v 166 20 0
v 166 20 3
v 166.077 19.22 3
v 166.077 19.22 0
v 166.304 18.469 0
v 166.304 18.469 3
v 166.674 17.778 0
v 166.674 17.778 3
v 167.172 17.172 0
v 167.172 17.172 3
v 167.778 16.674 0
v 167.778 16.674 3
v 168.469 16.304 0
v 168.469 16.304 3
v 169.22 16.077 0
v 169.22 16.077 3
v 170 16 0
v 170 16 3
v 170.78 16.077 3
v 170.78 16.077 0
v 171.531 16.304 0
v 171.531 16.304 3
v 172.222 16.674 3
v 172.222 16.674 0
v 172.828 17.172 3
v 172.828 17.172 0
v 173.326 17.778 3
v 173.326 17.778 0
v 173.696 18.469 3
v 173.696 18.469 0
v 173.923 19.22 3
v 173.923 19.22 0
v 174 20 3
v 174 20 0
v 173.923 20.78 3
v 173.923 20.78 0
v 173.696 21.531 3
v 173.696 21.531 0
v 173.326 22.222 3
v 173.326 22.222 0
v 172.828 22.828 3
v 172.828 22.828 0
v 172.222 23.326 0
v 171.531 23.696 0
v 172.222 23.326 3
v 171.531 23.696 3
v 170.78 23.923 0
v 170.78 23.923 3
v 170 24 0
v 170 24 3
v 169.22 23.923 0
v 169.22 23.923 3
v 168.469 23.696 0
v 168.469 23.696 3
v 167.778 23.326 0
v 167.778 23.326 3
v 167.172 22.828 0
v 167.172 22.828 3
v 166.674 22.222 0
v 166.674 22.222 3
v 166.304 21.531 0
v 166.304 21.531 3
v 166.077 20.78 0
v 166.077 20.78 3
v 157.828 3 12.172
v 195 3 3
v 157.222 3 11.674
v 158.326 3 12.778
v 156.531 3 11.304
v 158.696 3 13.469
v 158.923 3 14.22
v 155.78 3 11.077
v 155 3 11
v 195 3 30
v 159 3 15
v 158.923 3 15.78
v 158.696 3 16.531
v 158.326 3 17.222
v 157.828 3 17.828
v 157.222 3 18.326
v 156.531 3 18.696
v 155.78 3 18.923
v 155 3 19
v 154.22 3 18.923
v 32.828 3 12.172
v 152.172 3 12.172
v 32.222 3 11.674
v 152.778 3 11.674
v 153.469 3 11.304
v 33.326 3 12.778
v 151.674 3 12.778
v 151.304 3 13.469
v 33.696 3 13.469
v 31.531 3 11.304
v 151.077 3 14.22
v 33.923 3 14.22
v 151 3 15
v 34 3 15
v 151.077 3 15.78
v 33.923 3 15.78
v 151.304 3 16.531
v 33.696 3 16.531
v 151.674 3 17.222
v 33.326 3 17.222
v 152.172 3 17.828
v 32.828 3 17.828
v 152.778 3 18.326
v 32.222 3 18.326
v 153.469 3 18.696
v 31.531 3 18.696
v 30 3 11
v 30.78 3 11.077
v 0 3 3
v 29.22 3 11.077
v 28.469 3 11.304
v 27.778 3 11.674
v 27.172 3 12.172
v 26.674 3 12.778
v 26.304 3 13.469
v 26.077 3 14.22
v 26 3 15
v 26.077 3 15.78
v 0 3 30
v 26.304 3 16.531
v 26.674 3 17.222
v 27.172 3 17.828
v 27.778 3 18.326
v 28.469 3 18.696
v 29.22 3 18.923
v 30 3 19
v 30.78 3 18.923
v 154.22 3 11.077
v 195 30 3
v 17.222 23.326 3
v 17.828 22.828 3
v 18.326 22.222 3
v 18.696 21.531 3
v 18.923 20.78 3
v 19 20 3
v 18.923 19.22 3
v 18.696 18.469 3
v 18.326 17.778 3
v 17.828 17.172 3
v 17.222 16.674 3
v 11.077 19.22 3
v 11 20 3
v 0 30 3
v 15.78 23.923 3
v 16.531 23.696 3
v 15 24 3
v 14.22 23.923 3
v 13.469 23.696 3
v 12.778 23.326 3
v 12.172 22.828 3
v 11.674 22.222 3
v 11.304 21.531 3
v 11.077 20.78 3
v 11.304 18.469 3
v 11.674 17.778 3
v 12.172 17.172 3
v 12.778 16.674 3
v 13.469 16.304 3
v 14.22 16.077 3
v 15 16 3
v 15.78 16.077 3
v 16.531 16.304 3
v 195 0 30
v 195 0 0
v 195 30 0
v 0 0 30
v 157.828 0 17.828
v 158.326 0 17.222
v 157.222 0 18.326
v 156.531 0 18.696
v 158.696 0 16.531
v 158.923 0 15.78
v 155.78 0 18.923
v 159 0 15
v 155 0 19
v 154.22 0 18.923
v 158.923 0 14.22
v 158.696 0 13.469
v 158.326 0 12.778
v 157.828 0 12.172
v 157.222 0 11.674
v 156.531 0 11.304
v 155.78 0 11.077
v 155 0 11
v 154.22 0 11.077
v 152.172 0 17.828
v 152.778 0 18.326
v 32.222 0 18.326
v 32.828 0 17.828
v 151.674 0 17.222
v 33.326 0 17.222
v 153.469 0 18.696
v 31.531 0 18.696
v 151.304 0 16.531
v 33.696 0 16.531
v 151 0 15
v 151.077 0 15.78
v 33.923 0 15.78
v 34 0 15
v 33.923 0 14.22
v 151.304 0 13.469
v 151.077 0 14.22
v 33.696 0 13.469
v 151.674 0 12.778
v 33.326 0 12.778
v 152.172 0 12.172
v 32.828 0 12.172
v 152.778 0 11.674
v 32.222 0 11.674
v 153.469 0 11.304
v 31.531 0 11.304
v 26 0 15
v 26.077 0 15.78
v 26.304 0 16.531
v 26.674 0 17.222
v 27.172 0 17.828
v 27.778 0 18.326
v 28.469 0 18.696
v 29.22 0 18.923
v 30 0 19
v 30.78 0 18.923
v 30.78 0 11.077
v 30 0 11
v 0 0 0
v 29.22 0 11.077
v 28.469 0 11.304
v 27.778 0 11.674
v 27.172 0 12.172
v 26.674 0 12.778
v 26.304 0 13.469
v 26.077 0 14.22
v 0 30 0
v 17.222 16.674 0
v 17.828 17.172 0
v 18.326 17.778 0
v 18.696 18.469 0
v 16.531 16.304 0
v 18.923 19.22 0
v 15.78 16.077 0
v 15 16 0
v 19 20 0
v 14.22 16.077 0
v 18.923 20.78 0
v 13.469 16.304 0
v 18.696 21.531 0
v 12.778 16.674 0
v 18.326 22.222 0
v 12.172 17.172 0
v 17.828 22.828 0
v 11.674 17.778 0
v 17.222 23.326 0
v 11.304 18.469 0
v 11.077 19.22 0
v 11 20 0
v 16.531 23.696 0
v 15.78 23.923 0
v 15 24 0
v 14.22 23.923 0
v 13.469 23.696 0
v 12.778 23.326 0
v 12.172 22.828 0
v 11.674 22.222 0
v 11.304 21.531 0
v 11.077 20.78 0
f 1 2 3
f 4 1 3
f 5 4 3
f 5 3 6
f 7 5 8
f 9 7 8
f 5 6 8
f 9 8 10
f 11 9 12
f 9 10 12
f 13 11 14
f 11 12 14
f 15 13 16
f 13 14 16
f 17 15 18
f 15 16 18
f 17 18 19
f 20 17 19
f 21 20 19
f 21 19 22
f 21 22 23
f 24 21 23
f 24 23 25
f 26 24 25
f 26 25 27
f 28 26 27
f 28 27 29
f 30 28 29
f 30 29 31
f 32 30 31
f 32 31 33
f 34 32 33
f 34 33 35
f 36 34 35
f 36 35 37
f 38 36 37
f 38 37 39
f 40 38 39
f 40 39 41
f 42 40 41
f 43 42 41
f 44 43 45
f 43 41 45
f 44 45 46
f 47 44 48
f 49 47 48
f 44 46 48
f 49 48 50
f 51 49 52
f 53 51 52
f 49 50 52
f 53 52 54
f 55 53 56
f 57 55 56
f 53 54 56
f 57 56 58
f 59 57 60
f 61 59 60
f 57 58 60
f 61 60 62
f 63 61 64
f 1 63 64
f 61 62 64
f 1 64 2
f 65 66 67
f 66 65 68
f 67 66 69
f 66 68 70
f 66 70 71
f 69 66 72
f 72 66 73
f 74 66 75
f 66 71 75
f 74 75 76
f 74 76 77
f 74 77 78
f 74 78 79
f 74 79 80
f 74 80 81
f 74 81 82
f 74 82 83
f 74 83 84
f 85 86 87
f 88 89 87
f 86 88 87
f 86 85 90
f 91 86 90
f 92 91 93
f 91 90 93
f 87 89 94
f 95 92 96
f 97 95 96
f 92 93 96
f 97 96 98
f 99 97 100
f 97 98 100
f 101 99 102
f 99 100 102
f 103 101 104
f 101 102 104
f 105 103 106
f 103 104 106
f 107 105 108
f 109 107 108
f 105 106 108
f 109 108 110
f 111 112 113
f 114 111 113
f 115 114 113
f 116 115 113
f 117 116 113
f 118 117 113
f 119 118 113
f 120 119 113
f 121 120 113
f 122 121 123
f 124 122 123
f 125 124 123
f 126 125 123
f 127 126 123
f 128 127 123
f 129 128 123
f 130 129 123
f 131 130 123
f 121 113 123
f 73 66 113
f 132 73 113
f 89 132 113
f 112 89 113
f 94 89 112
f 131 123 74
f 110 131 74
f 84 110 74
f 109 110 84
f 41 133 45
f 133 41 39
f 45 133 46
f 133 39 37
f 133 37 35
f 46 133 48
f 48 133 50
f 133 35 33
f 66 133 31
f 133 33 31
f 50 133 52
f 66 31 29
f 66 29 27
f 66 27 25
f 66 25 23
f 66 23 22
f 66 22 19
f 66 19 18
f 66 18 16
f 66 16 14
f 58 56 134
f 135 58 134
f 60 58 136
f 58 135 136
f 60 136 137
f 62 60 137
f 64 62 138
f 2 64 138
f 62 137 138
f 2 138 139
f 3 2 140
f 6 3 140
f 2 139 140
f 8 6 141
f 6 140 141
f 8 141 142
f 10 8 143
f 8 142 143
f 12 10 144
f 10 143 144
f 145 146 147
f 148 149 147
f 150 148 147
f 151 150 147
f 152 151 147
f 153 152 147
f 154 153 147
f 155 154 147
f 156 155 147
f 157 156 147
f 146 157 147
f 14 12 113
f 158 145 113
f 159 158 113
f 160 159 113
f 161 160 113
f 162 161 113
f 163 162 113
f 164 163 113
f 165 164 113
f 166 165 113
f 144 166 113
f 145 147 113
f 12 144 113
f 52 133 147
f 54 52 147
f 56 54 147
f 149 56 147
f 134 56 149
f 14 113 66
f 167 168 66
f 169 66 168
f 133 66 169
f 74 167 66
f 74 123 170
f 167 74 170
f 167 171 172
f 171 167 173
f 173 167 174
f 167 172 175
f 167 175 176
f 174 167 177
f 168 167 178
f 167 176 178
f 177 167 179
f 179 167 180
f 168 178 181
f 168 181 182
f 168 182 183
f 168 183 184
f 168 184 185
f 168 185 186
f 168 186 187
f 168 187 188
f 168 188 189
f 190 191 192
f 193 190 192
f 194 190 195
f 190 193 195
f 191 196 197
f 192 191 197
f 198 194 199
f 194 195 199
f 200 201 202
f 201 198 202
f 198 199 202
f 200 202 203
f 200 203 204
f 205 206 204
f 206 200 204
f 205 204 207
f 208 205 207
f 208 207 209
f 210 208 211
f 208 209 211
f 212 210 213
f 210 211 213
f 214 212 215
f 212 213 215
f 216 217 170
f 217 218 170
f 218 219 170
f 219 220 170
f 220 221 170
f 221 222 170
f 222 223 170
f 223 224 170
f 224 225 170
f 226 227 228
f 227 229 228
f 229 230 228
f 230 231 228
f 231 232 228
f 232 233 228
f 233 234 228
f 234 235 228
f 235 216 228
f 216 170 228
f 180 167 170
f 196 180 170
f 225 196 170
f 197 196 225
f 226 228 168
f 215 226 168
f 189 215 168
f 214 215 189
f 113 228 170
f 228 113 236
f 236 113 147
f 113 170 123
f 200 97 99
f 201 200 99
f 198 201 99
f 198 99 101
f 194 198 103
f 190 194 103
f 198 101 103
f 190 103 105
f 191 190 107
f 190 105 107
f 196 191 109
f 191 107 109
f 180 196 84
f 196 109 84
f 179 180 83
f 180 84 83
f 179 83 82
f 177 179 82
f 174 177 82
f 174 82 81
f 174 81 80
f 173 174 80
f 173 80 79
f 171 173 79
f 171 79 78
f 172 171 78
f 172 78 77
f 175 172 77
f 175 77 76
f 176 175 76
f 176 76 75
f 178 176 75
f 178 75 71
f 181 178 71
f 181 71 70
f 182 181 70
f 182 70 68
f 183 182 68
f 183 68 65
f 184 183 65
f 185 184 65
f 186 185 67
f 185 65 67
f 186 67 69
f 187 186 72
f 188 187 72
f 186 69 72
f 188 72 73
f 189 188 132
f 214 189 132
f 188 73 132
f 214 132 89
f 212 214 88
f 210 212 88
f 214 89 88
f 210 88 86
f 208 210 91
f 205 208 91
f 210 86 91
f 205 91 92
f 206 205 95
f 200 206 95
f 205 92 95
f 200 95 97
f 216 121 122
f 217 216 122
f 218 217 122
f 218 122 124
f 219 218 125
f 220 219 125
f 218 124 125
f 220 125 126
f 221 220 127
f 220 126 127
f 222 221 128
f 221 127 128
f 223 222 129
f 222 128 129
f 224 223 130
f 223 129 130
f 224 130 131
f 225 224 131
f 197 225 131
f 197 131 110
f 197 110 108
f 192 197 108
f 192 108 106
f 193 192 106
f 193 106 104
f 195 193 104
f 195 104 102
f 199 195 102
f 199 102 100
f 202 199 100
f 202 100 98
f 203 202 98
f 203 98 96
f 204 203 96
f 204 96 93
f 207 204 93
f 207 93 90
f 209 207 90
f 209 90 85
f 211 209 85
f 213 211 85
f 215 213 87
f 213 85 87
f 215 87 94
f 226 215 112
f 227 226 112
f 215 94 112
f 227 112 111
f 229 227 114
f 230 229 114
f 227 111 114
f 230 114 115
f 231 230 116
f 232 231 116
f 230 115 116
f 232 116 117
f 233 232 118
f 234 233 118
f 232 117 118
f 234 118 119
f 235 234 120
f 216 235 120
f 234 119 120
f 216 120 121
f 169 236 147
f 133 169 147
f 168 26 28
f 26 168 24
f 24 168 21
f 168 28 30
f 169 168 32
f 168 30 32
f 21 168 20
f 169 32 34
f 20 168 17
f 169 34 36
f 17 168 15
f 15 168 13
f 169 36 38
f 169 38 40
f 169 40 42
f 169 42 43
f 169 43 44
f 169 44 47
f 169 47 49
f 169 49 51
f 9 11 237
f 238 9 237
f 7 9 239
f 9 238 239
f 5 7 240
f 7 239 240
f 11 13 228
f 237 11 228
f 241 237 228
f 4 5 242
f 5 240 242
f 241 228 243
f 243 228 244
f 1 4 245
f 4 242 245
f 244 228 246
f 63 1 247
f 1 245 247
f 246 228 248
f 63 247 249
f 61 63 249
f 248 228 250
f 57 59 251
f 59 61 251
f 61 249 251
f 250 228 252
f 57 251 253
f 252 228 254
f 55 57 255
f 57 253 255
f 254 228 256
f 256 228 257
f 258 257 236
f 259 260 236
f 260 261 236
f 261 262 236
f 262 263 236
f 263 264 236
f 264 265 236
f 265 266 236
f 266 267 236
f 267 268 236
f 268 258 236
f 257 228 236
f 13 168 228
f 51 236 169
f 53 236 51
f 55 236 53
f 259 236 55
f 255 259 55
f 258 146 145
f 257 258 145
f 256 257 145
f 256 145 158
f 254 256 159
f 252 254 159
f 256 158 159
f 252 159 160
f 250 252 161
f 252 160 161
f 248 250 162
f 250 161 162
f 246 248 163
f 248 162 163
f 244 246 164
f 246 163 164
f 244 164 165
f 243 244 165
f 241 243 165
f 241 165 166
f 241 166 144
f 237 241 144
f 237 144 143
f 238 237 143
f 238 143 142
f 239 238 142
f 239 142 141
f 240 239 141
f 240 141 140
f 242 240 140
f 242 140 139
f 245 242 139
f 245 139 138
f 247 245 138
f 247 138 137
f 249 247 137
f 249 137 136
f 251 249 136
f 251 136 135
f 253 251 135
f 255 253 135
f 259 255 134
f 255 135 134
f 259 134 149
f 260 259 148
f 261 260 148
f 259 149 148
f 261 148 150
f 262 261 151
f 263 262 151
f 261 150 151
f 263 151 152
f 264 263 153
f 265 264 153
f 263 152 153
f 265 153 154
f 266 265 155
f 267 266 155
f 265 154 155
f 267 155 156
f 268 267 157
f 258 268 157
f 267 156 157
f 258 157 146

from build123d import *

# Parameters (mm, degrees)
F1_DEPTH = 195
F3_D     = 8
F5_D     = 8


with BuildPart() as f1:
    # F0 (on Right) → F1 (new body)
    with BuildSketch(Plane.YZ):
        Polygon((0, 30), (0, 0), (30, 0), (30, 3), (3, 3), (3, 30), align=None)
    extrude(amount=F1_DEPTH)

    # F3 (through all)
    with Locations(Plane(origin=(0, 0, 0), x_dir=(1, 0, 0), z_dir=(0, 0, -1))):
        with Locations((15, -20), (170, -20)):
            Hole(F3_D / 2)

    # F5 (through all)
    with Locations(Plane.XZ):
        with Locations((30, 15), (155, 15)):
            Hole(F5_D / 2)


solid = f1.part
